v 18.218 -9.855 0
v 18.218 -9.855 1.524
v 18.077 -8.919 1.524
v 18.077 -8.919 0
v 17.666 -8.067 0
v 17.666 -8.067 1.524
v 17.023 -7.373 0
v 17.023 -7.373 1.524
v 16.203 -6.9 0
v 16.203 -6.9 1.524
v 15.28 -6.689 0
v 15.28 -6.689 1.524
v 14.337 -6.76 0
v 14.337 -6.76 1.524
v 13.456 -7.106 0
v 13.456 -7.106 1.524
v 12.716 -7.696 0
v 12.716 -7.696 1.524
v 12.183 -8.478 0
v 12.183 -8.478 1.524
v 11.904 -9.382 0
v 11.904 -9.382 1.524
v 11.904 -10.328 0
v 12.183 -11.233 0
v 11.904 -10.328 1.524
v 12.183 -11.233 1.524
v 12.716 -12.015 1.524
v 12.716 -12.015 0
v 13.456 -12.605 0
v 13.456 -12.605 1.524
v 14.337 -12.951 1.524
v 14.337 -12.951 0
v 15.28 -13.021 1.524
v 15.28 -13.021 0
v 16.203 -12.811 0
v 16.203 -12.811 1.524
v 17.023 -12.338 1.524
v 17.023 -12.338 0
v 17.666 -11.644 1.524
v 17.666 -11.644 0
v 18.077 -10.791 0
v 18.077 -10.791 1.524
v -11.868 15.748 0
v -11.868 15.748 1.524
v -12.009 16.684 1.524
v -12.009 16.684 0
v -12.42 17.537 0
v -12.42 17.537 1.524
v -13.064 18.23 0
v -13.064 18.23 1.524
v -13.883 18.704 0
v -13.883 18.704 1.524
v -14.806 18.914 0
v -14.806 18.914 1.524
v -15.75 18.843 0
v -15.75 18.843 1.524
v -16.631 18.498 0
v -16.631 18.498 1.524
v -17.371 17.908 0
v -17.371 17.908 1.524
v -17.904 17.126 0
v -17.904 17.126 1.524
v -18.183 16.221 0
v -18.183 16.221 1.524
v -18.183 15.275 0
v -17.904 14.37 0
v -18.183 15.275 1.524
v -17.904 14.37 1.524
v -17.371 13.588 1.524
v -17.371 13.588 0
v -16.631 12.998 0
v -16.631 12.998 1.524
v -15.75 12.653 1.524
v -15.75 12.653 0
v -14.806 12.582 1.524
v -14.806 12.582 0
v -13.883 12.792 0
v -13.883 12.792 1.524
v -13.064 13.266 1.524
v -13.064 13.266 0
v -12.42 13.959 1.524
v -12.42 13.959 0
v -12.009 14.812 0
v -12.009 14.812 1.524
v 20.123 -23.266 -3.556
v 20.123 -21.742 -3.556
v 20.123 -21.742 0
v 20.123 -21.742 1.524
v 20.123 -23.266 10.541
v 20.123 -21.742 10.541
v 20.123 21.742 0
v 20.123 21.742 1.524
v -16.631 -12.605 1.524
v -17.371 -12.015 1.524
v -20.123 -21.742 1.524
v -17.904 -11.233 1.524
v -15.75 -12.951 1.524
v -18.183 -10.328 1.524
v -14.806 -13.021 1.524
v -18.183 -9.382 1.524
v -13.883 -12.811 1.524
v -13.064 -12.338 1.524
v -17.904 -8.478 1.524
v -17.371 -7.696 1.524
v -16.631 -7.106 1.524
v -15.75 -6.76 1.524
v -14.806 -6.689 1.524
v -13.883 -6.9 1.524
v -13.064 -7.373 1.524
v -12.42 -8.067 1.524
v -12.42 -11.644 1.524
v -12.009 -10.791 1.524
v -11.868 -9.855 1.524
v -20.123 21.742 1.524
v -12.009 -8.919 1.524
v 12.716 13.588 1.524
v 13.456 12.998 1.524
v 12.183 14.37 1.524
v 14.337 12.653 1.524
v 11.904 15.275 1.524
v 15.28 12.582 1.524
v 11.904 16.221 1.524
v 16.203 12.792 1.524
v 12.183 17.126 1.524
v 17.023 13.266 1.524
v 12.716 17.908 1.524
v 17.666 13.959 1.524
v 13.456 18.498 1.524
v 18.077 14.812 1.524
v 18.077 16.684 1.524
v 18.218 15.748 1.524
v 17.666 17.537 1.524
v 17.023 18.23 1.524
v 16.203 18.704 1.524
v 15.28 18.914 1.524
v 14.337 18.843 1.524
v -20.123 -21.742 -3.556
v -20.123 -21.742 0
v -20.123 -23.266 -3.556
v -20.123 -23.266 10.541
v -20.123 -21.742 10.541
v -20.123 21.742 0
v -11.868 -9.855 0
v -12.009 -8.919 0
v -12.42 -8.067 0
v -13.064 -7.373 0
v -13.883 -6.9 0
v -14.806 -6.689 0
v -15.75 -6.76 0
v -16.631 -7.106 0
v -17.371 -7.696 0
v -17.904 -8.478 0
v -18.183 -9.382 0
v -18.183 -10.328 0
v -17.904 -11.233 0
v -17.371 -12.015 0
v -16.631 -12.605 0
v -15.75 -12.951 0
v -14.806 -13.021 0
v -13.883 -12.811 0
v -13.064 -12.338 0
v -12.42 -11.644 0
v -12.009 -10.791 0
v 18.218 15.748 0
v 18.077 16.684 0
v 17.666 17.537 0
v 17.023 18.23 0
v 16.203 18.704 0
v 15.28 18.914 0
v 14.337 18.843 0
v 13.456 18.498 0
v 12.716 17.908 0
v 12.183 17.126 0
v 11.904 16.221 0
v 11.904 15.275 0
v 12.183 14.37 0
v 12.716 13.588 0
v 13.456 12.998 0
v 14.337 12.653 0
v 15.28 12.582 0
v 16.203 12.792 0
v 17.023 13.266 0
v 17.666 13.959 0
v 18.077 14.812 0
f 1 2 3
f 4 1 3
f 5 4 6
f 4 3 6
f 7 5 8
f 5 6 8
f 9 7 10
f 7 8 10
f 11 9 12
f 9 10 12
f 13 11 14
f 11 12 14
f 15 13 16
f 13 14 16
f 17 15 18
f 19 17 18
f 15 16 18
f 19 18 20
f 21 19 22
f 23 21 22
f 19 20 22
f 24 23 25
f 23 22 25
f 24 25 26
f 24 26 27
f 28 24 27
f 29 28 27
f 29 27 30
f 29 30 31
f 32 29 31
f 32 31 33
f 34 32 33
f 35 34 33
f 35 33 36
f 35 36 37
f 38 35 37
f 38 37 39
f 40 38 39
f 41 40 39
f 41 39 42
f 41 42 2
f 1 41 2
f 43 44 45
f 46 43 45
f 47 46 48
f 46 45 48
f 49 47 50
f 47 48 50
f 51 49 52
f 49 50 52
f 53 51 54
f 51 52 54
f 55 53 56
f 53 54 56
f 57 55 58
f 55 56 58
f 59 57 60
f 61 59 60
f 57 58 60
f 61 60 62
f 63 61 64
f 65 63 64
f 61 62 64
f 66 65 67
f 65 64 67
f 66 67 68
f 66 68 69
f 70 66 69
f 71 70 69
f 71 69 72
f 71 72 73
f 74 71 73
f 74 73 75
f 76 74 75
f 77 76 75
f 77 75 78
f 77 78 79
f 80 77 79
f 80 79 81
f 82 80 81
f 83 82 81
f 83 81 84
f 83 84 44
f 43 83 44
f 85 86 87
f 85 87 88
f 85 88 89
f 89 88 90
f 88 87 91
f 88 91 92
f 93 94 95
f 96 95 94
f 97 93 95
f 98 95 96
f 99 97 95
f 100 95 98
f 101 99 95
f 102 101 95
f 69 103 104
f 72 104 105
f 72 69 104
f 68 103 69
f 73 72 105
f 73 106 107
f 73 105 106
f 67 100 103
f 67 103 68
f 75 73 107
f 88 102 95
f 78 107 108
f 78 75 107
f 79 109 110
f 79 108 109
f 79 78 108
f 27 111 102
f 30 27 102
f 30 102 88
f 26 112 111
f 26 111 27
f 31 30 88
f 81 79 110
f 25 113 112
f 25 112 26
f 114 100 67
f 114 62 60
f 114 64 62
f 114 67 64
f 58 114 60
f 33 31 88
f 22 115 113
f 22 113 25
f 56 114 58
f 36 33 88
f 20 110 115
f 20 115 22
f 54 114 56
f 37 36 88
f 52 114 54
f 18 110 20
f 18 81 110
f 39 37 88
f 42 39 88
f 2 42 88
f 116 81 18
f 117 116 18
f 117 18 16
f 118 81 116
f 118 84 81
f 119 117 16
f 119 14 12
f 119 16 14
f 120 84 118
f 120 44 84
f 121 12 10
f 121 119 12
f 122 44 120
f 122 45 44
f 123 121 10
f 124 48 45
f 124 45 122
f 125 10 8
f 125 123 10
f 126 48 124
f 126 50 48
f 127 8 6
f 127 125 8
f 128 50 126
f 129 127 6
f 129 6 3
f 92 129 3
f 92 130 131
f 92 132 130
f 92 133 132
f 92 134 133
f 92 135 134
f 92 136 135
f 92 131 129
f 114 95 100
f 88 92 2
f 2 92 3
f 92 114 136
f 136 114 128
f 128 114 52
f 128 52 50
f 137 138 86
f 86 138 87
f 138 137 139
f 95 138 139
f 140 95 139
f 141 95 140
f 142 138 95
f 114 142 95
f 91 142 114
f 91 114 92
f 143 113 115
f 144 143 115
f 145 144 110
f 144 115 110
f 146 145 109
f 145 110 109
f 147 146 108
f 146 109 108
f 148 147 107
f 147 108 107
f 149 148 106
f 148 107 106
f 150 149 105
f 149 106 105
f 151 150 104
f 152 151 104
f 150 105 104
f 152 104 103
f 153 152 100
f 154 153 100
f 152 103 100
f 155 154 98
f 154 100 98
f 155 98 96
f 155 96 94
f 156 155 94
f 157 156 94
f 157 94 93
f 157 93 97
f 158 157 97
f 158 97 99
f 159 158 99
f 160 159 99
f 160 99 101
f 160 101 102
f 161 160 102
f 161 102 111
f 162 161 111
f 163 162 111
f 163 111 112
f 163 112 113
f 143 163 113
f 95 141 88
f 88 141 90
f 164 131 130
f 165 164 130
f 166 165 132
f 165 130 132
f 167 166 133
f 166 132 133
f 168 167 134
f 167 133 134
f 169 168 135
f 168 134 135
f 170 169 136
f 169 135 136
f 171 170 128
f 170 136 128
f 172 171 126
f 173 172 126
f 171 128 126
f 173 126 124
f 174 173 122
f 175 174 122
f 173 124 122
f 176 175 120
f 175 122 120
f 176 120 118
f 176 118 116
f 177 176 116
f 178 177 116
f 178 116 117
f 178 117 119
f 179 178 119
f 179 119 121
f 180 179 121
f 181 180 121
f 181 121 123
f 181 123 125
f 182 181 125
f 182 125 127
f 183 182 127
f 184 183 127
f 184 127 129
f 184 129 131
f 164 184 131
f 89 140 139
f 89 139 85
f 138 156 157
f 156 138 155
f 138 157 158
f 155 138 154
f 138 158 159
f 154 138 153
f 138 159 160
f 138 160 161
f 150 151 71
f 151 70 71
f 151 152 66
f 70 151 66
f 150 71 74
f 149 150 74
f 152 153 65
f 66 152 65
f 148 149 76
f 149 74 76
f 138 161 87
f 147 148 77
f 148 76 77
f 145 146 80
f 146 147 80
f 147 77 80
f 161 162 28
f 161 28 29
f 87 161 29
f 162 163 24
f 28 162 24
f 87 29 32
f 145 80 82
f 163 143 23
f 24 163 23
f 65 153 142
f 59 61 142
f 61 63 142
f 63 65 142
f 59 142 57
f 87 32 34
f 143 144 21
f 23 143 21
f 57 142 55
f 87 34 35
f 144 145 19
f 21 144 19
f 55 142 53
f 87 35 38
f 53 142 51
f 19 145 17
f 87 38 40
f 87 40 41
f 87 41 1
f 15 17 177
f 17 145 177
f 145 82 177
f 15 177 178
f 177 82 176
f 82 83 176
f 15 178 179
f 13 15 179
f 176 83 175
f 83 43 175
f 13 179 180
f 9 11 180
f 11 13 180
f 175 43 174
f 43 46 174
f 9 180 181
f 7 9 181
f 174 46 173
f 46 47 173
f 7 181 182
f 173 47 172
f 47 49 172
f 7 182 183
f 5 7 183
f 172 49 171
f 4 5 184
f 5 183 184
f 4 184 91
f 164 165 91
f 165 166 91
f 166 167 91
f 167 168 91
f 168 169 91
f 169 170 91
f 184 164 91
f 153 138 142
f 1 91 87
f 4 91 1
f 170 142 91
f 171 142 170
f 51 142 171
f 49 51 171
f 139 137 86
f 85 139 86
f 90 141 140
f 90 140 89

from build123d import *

# Parameters (mm, degrees)
F0_W     = 40.2463
F0_H     = 43.4848
F1_DEPTH = 1.524
F2_W     = 40.2463
F2_H     = 14.097
F3_DEPTH = 1.524
F4_R     = 3.175
F5_DEPTH = 25.4


with BuildPart() as f1:
    # F0 (on Top) → F1 (new body)
    with BuildSketch(Plane.XY):
        Rectangle(F0_W, F0_H)
    extrude(amount=F1_DEPTH)

    # F2 (on face) → F3 (join)
    with BuildSketch(Plane.XZ.offset(21.7424)):
        with Locations((0, 3.4925)):
            Rectangle(F2_W, F2_H)
    extrude(amount=F3_DEPTH)

    # F4 (on face) → F5 (cut)
    with BuildSketch(Plane.XY.offset(1.524)):
        with Locations((15.04315, 15.748)):
            Circle(F4_R)
        with Locations((15.04315, -9.8552)):
            Circle(F4_R)
        with Locations((-15.04315, 15.748)):
            Circle(F4_R)
        with Locations((-15.04315, -9.8552)):
            Circle(F4_R)
    extrude(amount=-F5_DEPTH, mode=Mode.SUBTRACT)


solid = f1.part
